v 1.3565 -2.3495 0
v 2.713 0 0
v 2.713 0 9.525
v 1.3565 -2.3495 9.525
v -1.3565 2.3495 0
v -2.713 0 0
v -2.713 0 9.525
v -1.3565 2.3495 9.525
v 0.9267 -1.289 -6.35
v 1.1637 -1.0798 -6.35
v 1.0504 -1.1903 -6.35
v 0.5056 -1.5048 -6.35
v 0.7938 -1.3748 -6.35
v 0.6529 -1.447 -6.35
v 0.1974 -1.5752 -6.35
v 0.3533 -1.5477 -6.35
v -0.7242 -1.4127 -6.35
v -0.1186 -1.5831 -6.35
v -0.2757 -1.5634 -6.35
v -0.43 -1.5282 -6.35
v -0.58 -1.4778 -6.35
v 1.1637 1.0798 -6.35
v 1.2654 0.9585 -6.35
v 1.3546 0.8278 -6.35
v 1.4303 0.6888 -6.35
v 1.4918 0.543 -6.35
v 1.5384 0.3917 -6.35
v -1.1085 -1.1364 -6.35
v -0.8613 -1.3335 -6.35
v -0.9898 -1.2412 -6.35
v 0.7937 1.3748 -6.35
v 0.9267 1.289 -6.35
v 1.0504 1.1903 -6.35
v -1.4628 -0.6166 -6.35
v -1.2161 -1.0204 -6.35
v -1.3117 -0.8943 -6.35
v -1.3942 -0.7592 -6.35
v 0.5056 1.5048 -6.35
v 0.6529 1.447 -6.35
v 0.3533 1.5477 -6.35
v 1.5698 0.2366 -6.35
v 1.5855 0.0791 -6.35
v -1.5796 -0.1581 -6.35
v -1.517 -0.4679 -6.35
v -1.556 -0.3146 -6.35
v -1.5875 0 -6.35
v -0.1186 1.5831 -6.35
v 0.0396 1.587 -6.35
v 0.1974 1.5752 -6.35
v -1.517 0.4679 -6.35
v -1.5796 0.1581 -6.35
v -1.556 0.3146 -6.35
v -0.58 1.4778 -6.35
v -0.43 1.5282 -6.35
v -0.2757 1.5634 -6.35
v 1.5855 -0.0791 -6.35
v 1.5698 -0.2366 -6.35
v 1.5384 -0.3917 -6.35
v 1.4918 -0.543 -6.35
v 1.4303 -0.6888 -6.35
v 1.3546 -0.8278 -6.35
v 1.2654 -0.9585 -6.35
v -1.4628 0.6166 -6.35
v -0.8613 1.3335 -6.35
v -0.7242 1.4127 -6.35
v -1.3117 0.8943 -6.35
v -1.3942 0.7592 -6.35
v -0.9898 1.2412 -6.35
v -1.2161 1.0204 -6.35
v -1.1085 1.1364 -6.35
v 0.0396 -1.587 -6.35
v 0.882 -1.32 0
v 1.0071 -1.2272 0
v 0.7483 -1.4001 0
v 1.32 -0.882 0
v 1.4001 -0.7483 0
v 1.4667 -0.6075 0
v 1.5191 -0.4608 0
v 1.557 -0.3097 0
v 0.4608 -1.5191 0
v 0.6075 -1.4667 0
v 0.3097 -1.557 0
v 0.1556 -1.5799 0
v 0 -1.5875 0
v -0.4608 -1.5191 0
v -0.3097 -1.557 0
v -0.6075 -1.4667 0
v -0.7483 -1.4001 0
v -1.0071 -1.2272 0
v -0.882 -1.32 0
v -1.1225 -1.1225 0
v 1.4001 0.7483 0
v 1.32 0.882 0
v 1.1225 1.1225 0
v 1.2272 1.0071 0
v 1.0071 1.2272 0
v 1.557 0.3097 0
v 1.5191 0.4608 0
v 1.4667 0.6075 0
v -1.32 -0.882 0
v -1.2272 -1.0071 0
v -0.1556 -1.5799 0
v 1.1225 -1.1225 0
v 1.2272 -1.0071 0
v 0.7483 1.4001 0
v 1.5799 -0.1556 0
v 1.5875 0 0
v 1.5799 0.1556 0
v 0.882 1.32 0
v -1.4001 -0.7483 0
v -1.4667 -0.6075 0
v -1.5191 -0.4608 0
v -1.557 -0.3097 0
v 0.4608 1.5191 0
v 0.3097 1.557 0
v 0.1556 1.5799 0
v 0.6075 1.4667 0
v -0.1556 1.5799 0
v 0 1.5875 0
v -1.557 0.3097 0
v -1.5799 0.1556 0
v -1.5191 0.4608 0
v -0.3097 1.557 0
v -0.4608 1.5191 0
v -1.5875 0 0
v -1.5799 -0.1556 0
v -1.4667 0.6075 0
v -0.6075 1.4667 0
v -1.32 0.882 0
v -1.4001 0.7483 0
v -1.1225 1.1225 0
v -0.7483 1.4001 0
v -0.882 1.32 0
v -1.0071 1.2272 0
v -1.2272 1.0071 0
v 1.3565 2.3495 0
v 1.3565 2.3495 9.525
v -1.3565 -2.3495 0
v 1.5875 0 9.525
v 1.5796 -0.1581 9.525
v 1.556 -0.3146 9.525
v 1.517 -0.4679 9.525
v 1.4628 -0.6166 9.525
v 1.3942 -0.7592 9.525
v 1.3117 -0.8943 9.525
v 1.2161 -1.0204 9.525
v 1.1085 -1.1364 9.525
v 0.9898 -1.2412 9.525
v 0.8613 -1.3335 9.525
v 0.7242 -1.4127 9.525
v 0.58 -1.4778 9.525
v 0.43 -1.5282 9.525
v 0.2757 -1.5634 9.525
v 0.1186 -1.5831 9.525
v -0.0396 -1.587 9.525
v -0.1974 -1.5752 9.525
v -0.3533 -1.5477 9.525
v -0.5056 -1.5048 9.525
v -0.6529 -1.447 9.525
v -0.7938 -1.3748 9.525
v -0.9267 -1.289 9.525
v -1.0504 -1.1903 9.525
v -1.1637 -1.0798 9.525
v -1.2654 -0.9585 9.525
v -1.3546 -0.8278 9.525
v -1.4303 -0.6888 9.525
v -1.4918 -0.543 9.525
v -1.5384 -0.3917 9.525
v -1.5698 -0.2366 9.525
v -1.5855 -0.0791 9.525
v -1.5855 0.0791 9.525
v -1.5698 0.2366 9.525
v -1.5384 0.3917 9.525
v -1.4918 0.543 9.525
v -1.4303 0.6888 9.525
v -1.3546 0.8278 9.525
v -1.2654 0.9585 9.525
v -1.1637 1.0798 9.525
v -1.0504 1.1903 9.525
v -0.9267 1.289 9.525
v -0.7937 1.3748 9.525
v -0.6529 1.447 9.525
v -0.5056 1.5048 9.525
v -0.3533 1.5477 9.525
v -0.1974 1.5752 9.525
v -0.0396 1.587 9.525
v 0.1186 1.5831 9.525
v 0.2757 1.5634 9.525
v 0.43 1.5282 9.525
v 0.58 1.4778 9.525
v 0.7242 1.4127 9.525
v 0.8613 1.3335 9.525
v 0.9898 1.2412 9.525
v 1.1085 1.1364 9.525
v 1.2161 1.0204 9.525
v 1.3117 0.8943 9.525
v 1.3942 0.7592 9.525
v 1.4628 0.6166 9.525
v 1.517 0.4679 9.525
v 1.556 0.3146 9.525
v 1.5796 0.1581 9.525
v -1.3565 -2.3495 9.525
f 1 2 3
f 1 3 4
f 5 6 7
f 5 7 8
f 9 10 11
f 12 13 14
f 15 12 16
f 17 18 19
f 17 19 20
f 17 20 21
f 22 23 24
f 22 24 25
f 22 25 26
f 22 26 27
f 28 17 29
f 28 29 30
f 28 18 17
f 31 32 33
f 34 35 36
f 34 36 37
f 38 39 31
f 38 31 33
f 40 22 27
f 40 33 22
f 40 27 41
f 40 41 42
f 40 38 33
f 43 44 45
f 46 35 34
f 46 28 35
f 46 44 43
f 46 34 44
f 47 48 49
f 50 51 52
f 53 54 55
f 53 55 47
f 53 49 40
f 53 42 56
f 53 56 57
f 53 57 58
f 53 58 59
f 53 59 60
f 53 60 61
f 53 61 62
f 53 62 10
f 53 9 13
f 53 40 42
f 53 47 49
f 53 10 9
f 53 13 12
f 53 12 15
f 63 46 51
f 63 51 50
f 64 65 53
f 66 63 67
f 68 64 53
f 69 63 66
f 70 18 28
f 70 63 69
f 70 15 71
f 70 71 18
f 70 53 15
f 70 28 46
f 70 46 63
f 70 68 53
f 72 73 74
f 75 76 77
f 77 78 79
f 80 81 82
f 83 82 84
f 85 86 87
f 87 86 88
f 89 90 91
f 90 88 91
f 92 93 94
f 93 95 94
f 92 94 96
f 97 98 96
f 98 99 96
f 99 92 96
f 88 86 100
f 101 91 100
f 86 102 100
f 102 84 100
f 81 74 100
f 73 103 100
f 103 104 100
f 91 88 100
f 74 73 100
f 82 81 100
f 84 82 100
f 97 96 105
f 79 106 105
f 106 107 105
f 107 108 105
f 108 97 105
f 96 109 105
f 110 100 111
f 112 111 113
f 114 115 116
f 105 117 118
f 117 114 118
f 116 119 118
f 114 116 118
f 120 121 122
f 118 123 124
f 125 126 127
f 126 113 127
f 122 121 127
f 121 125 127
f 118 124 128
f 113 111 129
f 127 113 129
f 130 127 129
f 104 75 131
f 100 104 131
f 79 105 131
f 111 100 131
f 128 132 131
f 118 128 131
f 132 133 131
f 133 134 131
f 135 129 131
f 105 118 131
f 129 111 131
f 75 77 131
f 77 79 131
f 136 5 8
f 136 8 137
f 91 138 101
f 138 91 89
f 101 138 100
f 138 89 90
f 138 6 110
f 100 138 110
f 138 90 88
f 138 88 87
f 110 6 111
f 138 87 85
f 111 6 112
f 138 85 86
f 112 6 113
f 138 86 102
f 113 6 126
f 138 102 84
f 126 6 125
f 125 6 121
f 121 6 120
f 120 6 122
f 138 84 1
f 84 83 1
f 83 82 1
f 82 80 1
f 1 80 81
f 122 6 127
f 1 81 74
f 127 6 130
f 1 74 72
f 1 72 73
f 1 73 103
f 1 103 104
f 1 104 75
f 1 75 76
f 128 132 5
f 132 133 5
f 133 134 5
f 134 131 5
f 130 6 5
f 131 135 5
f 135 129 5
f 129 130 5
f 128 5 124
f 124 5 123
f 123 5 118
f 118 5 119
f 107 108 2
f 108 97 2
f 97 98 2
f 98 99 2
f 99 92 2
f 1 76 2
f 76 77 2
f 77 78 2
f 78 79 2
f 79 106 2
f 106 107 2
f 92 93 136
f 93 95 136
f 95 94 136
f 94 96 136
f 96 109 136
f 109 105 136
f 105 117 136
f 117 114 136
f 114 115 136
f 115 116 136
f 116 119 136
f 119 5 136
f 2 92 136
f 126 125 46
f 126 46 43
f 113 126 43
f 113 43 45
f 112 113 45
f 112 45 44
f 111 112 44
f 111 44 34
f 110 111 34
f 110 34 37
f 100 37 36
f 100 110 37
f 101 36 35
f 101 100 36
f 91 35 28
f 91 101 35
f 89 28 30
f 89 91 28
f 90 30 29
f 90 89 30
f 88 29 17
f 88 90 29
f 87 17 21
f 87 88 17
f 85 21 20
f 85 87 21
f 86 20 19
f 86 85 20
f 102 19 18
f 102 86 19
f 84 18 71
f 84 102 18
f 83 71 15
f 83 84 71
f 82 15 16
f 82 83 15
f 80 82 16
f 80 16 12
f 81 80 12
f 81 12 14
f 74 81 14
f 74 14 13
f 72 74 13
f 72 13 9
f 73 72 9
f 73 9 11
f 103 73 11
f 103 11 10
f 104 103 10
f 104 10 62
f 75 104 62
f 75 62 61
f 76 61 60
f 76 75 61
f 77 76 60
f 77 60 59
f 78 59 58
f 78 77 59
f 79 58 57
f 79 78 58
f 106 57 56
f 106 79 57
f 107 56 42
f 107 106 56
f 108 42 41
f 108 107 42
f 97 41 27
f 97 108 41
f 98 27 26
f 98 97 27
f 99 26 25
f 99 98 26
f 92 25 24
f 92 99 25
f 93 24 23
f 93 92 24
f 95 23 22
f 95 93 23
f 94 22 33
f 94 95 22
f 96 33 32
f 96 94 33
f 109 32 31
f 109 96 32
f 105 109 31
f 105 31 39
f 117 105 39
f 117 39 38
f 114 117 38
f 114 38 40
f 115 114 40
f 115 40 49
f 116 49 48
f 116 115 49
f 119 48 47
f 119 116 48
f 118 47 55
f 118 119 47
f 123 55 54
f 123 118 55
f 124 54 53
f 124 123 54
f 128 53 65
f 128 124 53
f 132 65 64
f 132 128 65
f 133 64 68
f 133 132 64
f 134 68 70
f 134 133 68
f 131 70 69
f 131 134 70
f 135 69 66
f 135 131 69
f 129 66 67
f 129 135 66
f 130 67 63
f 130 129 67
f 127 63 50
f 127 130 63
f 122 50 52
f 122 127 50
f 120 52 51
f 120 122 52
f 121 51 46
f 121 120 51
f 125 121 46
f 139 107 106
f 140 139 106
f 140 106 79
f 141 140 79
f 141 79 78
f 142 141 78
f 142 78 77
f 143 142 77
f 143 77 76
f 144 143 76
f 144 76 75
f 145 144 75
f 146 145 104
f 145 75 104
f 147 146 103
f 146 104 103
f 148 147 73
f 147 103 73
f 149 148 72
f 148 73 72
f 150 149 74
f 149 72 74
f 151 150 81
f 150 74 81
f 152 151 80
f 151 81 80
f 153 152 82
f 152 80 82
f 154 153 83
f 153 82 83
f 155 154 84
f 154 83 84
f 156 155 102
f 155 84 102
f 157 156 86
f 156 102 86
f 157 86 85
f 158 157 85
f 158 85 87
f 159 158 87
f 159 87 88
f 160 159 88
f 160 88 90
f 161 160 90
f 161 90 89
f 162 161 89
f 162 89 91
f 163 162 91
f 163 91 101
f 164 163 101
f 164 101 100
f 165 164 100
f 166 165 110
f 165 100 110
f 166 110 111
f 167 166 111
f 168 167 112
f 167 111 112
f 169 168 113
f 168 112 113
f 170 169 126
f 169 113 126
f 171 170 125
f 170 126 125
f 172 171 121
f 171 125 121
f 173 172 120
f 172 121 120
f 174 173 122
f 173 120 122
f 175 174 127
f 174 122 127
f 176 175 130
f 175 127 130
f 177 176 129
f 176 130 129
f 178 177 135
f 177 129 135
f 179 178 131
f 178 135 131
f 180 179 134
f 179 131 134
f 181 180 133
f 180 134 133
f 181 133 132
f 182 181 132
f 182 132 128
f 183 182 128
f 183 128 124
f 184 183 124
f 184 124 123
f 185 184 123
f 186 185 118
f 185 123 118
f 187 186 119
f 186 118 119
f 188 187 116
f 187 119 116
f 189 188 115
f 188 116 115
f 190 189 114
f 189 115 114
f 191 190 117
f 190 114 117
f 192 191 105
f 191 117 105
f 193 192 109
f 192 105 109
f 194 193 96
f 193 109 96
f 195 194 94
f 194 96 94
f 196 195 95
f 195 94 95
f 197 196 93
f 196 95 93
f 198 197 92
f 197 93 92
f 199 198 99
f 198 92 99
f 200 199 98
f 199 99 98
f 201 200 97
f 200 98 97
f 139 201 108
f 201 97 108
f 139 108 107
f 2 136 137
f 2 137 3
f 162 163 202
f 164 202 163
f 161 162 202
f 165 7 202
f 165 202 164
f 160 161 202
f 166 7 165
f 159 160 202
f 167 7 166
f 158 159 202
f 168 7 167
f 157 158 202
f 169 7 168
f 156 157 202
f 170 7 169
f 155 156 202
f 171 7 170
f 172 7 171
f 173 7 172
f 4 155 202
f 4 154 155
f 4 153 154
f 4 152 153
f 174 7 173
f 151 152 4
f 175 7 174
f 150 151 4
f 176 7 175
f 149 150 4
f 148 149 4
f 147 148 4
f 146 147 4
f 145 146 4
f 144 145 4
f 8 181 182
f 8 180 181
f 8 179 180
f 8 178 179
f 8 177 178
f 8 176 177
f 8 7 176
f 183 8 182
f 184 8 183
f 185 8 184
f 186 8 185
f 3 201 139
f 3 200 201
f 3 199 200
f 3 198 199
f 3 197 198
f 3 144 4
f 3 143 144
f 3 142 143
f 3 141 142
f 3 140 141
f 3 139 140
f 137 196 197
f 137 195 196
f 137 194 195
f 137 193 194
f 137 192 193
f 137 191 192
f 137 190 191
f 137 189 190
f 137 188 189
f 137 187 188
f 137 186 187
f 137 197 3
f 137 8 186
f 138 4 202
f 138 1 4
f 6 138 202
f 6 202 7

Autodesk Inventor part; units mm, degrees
ref_plane "YZ Plane" through (0, 0, 0) normal (1, 0, 0) x (0, 1, 0)
ref_plane "XZ Plane" through (0, 0, 0) normal (0, 1, 0) x (-1, 0, 0)
ref_plane "XY Plane" through (0, 0, 0) normal (0, 0, 1) x (1, 0, 0)
sketch "Sketch1" plane through (0, 0, 0) normal (0, 0, 1) x (1, 0, 0)
  line L0 (-2.713, 0) -> (-1.3565, 2.3495)
  line L1 (-1.3565, 2.3495) -> (1.3565, 2.3495)
  line L2 (1.3565, 2.3495) -> (2.713, 0)
  line L3 (2.713, 0) -> (1.3565, -2.3495)
  line L4 (1.3565, -2.3495) -> (-1.3565, -2.3495)
  line L5 (-1.3565, -2.3495) -> (-2.713, 0)
  circle A0 centre (0, 0) radius 1.5875
  dimension "d0" = 4.699
  dimension "d1" = 3.175
extrude "Extrusion1" add sketch "Sketch1" along normal blind 9.525
sketch "Sketch2" plane through (0, 0, 0) normal (0, 0, -1) x (-1, 0, 0)
  circle A0 centre (0, 0) radius 1.5875
extrude "Extrusion2" add sketch "Sketch2" along normal blind 6.35
thread "Thread1" size "5-40 UNC" class "2A" standard "ANSI Unified Screw Threads" full length
thread "Thread2" size "5-40 UNC" class "2B" standard "ANSI Unified Screw Threads" full length
properties part number "StandoffLong" material "Brass, Soft Yellow"
